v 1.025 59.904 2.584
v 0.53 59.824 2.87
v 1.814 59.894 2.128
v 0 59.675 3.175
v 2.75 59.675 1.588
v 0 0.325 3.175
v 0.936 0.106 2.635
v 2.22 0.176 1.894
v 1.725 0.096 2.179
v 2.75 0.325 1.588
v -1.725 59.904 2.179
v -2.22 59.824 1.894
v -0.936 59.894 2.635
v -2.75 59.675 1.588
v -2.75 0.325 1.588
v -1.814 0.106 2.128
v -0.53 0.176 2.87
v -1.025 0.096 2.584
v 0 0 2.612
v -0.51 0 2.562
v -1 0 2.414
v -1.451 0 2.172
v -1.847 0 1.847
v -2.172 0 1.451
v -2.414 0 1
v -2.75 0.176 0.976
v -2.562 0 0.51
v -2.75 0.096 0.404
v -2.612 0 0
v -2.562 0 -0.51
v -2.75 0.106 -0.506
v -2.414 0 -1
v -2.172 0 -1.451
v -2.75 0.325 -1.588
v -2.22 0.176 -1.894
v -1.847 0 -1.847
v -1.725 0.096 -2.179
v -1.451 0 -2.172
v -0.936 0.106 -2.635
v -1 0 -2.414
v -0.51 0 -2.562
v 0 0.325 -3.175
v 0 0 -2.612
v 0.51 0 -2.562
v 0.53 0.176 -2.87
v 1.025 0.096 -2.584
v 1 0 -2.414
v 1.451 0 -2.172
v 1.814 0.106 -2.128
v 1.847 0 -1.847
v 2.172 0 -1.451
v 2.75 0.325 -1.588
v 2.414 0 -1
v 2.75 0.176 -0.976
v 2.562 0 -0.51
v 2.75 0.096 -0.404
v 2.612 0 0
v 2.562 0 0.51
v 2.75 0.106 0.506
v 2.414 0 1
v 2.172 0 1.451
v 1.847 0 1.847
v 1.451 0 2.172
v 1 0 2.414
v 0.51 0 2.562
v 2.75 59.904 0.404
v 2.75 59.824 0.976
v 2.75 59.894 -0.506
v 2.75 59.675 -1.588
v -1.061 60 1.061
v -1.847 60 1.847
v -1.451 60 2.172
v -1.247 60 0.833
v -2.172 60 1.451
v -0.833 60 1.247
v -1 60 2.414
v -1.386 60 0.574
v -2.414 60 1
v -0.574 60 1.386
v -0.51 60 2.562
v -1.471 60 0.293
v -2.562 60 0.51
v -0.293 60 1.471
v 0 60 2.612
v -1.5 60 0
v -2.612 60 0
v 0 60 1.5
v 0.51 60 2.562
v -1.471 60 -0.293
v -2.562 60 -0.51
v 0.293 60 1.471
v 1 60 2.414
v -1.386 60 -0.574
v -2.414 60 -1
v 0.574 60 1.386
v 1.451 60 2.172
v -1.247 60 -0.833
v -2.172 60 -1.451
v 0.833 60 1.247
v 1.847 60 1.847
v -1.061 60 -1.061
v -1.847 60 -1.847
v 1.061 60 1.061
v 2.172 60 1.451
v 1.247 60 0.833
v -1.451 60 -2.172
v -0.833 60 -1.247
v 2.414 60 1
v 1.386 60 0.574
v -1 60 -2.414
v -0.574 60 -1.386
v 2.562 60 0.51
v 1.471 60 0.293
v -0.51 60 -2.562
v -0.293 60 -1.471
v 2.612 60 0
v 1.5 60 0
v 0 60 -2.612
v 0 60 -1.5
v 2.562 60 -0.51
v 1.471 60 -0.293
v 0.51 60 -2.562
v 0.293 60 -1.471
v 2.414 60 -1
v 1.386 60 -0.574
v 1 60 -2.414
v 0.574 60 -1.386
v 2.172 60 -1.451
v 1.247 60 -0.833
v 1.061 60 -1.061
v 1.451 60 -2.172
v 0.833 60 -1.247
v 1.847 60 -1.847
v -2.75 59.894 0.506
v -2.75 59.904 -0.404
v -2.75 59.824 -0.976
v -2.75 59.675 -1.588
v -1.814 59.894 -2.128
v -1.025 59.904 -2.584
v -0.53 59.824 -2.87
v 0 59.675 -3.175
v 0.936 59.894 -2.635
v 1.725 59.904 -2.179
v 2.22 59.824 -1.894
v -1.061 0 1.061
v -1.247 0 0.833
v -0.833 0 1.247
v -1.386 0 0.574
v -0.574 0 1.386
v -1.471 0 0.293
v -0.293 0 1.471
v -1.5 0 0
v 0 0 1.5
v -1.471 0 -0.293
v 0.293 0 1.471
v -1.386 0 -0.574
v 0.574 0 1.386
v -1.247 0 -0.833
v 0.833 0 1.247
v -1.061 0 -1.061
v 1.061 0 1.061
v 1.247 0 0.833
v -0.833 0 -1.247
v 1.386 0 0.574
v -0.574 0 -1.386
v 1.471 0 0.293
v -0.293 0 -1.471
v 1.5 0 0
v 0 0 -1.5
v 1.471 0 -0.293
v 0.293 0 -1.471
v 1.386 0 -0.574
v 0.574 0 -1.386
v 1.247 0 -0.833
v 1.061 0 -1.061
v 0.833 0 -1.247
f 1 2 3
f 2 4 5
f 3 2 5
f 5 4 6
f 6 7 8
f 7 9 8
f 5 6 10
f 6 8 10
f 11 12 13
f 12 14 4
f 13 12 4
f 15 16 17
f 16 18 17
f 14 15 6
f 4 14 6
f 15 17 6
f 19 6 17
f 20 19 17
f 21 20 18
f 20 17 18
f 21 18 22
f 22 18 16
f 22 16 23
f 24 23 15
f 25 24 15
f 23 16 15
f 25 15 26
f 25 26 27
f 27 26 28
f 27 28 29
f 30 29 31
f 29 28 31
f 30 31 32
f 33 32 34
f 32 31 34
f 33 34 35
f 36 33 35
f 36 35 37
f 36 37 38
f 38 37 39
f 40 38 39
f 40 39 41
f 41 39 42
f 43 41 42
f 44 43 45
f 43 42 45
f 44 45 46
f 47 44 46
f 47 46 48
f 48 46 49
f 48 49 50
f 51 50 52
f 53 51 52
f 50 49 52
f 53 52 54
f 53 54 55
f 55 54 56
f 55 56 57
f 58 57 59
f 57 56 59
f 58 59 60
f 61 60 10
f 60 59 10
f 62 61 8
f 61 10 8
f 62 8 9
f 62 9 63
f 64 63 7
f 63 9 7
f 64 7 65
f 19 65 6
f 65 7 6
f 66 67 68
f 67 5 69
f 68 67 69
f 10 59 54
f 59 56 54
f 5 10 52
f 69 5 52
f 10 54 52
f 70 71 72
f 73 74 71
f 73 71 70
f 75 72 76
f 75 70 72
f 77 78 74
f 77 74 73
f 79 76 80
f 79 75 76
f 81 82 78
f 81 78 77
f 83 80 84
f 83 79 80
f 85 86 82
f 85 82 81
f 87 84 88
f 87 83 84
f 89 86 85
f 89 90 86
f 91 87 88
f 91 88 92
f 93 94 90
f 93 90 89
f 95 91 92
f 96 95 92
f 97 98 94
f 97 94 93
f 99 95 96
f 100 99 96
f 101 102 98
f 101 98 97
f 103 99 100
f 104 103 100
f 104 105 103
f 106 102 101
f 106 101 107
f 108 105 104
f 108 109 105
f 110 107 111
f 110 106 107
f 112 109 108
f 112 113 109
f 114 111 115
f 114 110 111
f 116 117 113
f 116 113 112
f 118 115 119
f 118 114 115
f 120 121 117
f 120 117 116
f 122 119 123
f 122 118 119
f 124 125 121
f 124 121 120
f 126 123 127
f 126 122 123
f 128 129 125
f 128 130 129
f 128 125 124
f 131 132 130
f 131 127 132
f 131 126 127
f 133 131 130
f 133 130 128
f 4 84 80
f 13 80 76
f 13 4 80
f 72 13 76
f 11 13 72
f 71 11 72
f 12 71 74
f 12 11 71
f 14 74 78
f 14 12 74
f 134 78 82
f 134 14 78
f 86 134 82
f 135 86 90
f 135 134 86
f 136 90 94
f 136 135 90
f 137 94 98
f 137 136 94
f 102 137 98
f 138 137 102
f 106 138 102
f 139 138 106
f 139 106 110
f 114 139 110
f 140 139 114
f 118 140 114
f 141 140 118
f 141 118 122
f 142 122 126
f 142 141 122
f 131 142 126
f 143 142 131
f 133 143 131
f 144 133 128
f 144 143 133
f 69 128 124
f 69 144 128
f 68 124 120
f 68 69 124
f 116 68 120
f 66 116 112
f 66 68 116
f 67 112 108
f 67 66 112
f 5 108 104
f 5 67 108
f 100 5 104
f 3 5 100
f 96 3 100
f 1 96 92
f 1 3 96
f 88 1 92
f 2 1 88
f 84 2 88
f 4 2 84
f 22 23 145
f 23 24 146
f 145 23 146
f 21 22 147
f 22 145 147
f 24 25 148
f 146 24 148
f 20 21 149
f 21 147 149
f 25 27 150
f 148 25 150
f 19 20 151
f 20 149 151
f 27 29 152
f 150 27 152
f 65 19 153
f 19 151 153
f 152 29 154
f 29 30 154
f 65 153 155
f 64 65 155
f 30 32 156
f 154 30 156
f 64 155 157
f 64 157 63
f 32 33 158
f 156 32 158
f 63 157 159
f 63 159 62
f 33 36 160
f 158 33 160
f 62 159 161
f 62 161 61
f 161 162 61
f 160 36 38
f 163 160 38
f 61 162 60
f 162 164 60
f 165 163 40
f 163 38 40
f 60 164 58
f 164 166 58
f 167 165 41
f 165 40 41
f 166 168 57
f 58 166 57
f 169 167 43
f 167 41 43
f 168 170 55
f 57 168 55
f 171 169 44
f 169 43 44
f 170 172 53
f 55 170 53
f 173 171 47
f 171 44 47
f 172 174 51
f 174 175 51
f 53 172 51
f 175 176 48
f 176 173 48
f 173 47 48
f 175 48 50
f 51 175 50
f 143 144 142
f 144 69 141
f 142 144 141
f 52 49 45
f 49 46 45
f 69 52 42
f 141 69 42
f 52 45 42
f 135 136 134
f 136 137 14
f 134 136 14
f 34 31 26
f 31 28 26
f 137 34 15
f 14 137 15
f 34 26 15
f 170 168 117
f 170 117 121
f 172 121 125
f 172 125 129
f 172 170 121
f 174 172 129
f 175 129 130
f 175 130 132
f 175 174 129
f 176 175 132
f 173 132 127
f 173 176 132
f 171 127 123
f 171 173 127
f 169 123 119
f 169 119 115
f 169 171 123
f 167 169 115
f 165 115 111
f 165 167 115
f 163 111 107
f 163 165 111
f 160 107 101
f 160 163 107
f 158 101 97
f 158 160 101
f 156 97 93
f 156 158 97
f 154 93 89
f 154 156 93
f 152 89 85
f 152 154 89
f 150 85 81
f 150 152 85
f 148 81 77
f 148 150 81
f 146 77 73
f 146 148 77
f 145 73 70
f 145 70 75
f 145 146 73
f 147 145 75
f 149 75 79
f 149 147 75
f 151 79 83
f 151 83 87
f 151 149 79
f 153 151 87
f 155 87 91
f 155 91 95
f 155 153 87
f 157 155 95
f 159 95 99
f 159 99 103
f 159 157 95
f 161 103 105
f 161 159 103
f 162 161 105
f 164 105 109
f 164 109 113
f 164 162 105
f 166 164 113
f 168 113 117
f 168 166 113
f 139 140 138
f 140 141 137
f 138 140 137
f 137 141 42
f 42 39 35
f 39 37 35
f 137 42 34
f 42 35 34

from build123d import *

# Parameters (mm, degrees)
SKETCH_1_R      = 1.5
EXTRUDE_1_DEPTH = 60


with BuildPart() as part:
    # Эскиз1 → Бобышка-Вытянуть1 (new body)
    with BuildSketch(Plane(origin=(0, 0, 0), x_dir=(1, 0, 0), z_dir=(0, 1, 0))):
        Polygon((0, 3.175426481), (-2.75, 1.58771324), (-2.75, -1.58771324), (0, -3.175426481), (2.75, -1.58771324), (2.75, 1.58771324), align=None)
        Circle(SKETCH_1_R, mode=Mode.SUBTRACT)
    extrude(amount=EXTRUDE_1_DEPTH)

    # Эскиз3 → Вырез-Повернуть1 (revolve, cut)
    with BuildSketch(Plane(origin=(0, 0, 0), x_dir=(0, 0, -1), z_dir=(1, 0, 0))):
        Polygon((-8.378043736, 3.328738228), (-8.378043736, 0), (-2.6125, 0), align=None)
        Polygon((-11.931875613, 60), (-2.6125, 60), (-11.931875613, 54.619455981), align=None)
    revolve(axis=Axis((0, 60, 0), (0, -1, 0)), mode=Mode.SUBTRACT)


solid = part.part
